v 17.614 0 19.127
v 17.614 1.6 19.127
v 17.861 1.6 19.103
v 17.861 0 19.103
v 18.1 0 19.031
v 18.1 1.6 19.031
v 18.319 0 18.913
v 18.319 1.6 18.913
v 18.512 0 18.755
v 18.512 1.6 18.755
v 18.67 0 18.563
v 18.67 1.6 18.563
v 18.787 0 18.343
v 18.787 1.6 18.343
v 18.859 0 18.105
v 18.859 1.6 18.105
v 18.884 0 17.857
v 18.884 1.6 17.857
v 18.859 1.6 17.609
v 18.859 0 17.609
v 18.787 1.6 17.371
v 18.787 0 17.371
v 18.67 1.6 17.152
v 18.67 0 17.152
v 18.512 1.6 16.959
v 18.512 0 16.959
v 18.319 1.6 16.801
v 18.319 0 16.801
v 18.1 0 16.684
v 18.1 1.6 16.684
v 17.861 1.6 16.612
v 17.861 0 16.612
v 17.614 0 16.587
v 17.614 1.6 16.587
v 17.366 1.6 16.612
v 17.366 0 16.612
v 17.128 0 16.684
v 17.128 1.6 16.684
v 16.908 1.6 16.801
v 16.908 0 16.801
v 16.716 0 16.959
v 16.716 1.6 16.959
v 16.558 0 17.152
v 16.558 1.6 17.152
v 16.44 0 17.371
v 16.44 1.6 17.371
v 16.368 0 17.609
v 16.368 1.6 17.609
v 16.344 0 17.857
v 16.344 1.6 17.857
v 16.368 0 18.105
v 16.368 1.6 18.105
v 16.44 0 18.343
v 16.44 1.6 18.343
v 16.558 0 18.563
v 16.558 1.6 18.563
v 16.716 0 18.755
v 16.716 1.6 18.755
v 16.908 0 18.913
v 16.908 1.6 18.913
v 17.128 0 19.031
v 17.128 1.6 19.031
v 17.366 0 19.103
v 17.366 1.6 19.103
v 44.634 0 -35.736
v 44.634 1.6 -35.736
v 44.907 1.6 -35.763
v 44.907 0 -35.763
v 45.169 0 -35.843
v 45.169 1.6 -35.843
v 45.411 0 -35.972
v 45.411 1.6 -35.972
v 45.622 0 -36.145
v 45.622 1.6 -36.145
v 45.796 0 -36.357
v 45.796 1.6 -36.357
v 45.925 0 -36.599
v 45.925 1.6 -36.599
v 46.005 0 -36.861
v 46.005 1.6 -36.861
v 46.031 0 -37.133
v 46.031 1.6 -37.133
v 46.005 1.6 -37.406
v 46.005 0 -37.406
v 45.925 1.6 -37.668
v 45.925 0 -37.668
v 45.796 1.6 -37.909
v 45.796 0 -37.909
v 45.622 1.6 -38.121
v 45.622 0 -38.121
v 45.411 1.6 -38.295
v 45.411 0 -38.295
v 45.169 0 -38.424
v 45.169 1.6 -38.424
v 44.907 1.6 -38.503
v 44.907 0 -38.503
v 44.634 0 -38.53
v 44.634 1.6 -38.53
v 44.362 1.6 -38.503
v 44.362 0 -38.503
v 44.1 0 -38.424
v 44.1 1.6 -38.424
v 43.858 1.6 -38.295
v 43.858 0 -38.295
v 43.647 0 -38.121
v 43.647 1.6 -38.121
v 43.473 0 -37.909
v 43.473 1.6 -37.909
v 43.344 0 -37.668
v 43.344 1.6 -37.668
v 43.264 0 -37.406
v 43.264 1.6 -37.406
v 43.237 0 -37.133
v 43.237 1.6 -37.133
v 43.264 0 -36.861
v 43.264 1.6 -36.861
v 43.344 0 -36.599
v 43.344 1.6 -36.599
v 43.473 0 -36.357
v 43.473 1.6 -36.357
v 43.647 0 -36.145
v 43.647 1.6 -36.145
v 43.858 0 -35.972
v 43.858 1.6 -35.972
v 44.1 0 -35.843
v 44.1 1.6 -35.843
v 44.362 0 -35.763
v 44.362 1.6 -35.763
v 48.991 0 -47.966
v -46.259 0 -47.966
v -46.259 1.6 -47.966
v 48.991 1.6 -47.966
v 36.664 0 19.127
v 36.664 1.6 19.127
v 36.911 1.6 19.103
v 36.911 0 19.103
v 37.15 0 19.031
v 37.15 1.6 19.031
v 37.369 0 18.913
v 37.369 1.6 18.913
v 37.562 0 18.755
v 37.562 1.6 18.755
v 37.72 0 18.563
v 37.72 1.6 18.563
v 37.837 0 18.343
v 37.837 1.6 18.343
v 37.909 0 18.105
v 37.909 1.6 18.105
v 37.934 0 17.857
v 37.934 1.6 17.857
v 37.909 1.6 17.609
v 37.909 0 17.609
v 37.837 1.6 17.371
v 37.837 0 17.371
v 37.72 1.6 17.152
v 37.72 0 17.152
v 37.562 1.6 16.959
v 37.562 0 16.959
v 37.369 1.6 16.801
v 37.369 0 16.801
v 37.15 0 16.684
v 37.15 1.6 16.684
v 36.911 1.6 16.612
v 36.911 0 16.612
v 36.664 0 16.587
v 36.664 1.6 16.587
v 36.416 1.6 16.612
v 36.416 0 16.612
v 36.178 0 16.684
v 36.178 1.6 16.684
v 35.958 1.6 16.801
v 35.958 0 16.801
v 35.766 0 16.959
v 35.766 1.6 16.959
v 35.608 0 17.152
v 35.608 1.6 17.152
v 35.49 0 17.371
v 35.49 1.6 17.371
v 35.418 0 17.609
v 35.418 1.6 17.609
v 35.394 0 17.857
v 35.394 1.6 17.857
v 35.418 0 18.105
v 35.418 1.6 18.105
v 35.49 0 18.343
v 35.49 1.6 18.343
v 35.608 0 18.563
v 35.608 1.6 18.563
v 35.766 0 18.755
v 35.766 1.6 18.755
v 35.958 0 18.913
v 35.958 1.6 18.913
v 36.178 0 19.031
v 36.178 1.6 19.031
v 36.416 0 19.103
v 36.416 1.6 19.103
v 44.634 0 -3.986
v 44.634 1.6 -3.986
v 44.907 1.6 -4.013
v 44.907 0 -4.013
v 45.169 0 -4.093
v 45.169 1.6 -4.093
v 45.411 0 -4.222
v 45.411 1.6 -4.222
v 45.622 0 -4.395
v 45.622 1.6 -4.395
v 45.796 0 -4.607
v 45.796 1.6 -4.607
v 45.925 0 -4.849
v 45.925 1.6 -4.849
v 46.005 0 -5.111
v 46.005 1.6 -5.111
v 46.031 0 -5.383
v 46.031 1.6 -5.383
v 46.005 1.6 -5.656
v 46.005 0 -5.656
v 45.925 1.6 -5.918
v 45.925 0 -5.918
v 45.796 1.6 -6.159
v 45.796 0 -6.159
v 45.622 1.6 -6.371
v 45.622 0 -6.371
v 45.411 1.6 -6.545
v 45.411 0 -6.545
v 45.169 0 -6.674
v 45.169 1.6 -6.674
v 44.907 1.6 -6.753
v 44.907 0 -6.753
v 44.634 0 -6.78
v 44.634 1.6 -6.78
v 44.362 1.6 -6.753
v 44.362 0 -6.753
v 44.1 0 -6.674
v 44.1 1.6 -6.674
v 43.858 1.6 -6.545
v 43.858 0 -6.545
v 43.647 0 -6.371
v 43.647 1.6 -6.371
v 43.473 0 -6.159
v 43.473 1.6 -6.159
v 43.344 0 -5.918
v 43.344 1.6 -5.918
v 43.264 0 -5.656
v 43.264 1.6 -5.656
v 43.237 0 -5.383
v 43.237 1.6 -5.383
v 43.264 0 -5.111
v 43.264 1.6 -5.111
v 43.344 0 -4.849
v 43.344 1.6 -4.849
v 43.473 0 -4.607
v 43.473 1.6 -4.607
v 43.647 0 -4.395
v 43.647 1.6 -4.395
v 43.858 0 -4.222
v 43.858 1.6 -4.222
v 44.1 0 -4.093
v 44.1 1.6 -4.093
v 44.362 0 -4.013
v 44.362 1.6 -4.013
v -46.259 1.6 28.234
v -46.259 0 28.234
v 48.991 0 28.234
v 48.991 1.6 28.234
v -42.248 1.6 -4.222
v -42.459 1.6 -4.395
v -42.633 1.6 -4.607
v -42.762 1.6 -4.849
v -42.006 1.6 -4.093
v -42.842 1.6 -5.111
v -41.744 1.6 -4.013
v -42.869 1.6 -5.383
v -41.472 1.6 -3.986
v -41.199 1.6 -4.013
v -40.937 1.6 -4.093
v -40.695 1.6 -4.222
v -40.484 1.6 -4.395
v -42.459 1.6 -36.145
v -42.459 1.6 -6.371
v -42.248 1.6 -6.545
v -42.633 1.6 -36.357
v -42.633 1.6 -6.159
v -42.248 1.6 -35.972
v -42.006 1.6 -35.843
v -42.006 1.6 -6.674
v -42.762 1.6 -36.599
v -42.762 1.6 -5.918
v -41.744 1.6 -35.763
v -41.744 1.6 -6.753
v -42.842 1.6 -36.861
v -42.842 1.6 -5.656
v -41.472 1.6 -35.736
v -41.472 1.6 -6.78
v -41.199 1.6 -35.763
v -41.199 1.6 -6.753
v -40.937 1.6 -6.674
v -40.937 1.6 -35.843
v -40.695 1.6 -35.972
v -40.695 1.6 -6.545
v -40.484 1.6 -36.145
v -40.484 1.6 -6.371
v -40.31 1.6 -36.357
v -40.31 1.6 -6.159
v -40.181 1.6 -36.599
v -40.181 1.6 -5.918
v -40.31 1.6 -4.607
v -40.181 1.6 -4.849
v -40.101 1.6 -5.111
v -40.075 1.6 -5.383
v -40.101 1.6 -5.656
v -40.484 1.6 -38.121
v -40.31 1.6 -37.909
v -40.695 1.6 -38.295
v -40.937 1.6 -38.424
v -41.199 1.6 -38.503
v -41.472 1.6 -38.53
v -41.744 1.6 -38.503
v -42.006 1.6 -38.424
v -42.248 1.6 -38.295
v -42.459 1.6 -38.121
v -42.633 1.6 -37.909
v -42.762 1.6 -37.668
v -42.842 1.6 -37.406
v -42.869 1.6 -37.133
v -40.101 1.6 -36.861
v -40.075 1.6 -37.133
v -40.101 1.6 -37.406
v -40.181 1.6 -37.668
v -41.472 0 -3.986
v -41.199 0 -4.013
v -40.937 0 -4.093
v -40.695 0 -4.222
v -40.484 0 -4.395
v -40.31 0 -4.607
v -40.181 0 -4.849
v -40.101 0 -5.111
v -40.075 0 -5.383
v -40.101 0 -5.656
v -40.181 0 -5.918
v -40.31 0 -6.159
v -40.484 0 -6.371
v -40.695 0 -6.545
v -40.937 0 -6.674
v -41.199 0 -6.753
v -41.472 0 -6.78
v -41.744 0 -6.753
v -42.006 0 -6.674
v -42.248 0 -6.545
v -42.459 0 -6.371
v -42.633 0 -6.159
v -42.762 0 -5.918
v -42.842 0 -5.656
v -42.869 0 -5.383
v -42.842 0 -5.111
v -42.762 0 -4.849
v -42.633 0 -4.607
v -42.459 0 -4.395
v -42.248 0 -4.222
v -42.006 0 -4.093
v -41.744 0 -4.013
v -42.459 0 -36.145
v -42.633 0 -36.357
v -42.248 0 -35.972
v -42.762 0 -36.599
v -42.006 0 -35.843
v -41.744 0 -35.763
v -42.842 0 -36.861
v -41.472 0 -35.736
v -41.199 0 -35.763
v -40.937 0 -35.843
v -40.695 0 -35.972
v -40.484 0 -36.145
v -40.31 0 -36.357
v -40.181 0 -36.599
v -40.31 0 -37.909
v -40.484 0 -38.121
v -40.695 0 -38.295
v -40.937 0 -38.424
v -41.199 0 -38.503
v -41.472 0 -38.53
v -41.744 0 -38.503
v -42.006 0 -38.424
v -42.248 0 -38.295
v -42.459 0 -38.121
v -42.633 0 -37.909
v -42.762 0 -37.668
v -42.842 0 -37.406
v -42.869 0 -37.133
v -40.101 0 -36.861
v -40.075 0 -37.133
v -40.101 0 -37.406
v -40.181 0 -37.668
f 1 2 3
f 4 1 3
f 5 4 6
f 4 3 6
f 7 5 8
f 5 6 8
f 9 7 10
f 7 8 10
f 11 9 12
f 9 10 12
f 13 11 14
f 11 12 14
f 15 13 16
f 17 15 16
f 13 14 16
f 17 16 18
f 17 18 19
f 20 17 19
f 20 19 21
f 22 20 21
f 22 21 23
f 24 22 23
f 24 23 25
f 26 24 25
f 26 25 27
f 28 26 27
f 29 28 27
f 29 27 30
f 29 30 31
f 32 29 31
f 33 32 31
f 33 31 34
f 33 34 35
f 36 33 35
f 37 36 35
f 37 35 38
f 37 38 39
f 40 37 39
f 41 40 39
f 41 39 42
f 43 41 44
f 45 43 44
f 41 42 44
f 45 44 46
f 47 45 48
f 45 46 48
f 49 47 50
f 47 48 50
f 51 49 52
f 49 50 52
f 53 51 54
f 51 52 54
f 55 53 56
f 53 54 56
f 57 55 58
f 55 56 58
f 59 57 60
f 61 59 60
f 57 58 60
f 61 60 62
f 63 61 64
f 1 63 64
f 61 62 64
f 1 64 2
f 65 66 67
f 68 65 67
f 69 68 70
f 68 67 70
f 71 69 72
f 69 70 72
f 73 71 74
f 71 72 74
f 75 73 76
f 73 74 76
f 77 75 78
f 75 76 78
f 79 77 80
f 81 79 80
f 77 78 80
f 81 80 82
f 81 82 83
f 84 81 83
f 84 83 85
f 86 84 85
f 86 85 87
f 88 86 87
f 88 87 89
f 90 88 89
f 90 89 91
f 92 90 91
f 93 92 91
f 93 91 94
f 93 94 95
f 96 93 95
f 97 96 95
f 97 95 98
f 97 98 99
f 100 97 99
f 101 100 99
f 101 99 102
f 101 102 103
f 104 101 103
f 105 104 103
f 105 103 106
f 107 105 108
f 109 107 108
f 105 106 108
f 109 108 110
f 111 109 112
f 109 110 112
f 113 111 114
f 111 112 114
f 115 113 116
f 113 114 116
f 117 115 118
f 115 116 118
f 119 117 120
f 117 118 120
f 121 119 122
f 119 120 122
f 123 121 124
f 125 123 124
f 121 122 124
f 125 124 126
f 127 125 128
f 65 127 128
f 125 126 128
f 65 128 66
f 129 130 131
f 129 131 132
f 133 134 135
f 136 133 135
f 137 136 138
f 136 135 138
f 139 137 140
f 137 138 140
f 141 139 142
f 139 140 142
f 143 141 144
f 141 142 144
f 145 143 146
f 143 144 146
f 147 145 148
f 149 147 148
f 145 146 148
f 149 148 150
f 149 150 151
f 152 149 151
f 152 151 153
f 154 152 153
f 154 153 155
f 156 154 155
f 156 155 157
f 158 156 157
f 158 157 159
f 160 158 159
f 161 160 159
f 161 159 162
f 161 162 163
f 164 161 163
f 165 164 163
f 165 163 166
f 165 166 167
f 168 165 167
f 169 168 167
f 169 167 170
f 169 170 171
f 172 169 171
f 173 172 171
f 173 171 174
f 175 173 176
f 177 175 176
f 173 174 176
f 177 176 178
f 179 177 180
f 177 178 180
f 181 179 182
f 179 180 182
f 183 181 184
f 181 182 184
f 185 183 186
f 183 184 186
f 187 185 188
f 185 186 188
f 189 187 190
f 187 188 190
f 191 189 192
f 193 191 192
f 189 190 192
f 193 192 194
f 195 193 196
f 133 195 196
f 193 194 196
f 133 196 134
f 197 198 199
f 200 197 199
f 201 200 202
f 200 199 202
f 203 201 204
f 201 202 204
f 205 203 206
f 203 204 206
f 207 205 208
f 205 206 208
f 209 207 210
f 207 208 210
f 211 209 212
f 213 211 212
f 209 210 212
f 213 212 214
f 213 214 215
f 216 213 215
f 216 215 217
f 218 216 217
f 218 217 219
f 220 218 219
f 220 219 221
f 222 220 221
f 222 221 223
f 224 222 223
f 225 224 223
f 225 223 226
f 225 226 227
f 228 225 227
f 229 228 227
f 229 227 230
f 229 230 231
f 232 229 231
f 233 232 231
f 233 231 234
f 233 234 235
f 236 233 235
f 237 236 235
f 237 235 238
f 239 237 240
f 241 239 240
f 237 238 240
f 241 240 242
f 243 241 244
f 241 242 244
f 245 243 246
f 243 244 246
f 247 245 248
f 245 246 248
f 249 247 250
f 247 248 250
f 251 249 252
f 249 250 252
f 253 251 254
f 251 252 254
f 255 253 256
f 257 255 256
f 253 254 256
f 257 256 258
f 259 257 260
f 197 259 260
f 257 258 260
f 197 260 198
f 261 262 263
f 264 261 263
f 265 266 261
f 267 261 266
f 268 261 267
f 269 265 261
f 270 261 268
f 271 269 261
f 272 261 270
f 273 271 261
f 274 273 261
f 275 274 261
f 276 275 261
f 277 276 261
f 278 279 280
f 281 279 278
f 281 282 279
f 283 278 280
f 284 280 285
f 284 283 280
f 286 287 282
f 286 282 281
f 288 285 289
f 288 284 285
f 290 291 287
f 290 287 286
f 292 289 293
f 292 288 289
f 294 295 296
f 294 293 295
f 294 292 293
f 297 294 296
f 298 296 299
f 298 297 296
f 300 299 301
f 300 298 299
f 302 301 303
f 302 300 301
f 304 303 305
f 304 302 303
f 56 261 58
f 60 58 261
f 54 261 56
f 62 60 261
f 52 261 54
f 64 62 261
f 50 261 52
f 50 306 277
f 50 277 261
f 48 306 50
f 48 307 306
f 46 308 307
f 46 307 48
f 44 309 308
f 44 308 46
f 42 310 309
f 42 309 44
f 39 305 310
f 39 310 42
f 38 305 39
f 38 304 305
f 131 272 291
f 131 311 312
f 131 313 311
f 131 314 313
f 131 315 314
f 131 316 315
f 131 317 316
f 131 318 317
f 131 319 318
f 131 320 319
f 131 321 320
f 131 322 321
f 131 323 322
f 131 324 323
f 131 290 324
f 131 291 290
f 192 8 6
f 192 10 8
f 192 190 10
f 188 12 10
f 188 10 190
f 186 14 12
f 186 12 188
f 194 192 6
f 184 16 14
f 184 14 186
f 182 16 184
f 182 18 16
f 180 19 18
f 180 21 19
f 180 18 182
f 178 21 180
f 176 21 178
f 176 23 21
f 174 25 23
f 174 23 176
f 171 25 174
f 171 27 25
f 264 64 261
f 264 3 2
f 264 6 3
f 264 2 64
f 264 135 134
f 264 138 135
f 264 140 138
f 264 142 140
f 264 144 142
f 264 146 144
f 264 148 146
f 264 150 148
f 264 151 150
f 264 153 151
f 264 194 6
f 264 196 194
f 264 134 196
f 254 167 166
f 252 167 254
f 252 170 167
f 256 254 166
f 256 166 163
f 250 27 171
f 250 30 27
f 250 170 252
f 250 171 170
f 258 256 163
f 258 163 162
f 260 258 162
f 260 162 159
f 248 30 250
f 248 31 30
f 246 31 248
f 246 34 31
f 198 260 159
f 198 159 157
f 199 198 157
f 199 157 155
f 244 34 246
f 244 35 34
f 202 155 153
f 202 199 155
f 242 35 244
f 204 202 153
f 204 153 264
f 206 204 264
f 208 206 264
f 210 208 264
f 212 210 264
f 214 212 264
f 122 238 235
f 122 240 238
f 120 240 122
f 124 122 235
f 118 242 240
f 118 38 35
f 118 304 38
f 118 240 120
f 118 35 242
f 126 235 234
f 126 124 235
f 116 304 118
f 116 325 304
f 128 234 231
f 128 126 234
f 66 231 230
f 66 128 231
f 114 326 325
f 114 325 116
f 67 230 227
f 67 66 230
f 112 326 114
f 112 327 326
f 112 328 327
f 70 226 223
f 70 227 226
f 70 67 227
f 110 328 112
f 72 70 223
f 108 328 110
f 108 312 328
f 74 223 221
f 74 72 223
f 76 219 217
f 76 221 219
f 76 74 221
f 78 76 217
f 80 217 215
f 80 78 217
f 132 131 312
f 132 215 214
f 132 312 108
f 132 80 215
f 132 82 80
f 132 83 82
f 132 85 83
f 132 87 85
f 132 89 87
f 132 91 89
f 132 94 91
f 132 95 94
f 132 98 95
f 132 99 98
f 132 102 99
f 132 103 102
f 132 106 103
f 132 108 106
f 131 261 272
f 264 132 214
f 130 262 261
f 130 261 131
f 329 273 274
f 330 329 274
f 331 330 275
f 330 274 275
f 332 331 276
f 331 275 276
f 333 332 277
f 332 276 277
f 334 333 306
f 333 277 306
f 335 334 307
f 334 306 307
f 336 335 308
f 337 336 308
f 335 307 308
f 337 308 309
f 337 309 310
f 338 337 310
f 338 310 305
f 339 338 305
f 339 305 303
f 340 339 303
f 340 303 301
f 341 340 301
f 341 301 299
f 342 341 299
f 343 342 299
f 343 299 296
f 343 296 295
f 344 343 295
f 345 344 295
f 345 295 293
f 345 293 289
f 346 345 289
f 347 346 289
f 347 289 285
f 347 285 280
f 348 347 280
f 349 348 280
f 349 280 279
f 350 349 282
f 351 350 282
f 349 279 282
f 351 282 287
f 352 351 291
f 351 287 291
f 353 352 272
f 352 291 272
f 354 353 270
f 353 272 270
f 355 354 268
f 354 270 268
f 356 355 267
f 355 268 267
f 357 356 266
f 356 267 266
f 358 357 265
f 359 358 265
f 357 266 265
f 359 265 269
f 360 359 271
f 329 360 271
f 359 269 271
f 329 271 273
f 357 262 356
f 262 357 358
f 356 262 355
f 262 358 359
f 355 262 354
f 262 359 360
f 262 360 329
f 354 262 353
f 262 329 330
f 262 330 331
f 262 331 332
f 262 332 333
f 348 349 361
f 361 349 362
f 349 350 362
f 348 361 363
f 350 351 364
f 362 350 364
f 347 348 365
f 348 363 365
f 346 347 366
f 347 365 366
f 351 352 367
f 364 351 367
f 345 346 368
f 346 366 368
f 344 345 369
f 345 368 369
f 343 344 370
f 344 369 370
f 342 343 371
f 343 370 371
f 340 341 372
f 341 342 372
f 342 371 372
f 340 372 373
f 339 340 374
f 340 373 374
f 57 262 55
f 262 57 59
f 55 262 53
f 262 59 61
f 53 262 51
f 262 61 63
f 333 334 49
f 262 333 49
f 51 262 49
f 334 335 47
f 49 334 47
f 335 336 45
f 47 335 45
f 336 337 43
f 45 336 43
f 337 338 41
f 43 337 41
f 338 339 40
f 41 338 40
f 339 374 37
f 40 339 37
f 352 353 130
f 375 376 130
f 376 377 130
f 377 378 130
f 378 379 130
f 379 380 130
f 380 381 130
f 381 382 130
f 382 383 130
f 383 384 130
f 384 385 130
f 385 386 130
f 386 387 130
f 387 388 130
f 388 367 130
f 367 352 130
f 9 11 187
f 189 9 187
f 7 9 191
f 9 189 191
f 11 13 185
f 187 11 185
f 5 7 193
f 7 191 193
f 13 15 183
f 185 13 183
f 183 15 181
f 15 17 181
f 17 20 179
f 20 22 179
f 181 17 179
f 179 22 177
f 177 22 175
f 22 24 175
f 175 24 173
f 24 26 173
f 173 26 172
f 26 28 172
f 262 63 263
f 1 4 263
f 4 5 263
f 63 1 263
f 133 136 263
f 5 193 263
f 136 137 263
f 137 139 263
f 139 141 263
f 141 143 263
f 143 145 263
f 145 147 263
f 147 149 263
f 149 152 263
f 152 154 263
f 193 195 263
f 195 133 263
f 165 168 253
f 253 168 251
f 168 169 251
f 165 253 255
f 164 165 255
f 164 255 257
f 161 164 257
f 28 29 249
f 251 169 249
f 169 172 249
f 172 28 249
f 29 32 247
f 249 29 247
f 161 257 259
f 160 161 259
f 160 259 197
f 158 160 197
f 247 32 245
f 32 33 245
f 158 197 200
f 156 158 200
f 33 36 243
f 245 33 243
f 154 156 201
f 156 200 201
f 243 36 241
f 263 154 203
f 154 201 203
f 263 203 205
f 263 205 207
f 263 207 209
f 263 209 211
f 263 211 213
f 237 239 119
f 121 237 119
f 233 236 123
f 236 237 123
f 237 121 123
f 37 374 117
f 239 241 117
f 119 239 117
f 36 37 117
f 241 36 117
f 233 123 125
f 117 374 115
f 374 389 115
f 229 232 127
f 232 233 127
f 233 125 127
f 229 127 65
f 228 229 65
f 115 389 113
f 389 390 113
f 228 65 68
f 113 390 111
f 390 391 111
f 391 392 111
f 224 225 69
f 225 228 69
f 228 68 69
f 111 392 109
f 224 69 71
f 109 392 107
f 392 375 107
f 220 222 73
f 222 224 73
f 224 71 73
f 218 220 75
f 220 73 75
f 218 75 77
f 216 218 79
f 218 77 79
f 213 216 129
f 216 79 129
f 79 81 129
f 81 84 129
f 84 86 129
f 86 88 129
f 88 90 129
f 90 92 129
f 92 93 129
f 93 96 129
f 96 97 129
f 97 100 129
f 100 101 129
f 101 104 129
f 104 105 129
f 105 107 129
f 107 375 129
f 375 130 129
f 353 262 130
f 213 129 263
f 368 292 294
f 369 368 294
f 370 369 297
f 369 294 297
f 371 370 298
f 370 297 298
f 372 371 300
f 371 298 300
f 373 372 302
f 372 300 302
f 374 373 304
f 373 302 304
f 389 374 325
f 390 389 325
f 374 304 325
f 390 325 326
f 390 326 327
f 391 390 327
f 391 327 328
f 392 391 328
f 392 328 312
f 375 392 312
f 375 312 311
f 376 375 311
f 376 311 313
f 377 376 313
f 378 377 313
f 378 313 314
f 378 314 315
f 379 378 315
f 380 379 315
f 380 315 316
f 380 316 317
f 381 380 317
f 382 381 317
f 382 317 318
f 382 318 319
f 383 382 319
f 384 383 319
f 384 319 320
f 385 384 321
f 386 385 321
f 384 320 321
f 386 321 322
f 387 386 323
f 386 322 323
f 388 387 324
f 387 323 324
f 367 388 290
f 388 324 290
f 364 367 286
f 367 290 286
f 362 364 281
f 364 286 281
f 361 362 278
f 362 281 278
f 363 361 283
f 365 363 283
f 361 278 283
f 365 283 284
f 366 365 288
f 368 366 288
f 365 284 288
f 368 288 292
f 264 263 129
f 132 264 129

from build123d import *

# Parameters (mm, degrees)
SKETCH1_W            = 95.25
SKETCH1_H            = 76.2
BOSS_EXTRUDE1_DEPTH  = 1.600000102
SKETCH2_R            = 1.397
CUT_EXTRUDE1_DEPTH   = 69.581436034
LPATTERN1_COUNT      = 2
LPATTERN1_PITCH      = 86.106
LPATTERN1_COUNT_DIR2 = 2
LPATTERN1_PITCH_DIR2 = 31.75
SKETCH4_R            = 1.27
CUT_EXTRUDE2_DEPTH   = 69.581436034
LPATTERN2_COUNT      = 2
LPATTERN2_PITCH      = 19.05


with BuildPart() as part:
    # Sketch1 → Boss-Extrude1 (new body)
    with BuildSketch(Plane(origin=(0, 0, 0), x_dir=(1, 0, 0), z_dir=(0, 1, 0))):
        with Locations((1.365591398, 9.866397849)):
            Rectangle(SKETCH1_W, SKETCH1_H)
    extrude(amount=BOSS_EXTRUDE1_DEPTH)

    # Sketch2 → Cut-Extrude1 (cut, through all)
    with BuildSketch(Plane(origin=(0, 1.600000102, 0), x_dir=(1, 0, 0), z_dir=(0, 1, 0))):
        with Locations(Location((-41.471508602, 37.133297849, 0), (0, 0, 270))):
            Circle(SKETCH2_R)
    cut_extrude1 = extrude(amount=-CUT_EXTRUDE1_DEPTH, mode=Mode.SUBTRACT)

    # LPattern1: Cut-Extrude1 2 × 2
    with Locations(*[(i * LPATTERN1_PITCH, 0, j * LPATTERN1_PITCH_DIR2) for i in range(LPATTERN1_COUNT) for j in range(LPATTERN1_COUNT_DIR2) if (i, j) != (0, 0)]):
        add(cut_extrude1, mode=Mode.SUBTRACT)

    # Sketch4 → Cut-Extrude2 (cut, through all)
    with BuildSketch(Plane(origin=(0, 1.600000102, 0), x_dir=(1, 0, 0), z_dir=(0, 1, 0))):
        with Locations(Location((17.613555931, -17.857220142, 0), (0, 0, 270))):
            Circle(SKETCH4_R)
    cut_extrude2 = extrude(amount=-CUT_EXTRUDE2_DEPTH, mode=Mode.SUBTRACT)

    # LPattern2: Cut-Extrude2 ×2
    with Locations(*[(i * LPATTERN2_PITCH, 0, 0) for i in range(1, LPATTERN2_COUNT)]):
        add(cut_extrude2, mode=Mode.SUBTRACT)


solid = part.part
